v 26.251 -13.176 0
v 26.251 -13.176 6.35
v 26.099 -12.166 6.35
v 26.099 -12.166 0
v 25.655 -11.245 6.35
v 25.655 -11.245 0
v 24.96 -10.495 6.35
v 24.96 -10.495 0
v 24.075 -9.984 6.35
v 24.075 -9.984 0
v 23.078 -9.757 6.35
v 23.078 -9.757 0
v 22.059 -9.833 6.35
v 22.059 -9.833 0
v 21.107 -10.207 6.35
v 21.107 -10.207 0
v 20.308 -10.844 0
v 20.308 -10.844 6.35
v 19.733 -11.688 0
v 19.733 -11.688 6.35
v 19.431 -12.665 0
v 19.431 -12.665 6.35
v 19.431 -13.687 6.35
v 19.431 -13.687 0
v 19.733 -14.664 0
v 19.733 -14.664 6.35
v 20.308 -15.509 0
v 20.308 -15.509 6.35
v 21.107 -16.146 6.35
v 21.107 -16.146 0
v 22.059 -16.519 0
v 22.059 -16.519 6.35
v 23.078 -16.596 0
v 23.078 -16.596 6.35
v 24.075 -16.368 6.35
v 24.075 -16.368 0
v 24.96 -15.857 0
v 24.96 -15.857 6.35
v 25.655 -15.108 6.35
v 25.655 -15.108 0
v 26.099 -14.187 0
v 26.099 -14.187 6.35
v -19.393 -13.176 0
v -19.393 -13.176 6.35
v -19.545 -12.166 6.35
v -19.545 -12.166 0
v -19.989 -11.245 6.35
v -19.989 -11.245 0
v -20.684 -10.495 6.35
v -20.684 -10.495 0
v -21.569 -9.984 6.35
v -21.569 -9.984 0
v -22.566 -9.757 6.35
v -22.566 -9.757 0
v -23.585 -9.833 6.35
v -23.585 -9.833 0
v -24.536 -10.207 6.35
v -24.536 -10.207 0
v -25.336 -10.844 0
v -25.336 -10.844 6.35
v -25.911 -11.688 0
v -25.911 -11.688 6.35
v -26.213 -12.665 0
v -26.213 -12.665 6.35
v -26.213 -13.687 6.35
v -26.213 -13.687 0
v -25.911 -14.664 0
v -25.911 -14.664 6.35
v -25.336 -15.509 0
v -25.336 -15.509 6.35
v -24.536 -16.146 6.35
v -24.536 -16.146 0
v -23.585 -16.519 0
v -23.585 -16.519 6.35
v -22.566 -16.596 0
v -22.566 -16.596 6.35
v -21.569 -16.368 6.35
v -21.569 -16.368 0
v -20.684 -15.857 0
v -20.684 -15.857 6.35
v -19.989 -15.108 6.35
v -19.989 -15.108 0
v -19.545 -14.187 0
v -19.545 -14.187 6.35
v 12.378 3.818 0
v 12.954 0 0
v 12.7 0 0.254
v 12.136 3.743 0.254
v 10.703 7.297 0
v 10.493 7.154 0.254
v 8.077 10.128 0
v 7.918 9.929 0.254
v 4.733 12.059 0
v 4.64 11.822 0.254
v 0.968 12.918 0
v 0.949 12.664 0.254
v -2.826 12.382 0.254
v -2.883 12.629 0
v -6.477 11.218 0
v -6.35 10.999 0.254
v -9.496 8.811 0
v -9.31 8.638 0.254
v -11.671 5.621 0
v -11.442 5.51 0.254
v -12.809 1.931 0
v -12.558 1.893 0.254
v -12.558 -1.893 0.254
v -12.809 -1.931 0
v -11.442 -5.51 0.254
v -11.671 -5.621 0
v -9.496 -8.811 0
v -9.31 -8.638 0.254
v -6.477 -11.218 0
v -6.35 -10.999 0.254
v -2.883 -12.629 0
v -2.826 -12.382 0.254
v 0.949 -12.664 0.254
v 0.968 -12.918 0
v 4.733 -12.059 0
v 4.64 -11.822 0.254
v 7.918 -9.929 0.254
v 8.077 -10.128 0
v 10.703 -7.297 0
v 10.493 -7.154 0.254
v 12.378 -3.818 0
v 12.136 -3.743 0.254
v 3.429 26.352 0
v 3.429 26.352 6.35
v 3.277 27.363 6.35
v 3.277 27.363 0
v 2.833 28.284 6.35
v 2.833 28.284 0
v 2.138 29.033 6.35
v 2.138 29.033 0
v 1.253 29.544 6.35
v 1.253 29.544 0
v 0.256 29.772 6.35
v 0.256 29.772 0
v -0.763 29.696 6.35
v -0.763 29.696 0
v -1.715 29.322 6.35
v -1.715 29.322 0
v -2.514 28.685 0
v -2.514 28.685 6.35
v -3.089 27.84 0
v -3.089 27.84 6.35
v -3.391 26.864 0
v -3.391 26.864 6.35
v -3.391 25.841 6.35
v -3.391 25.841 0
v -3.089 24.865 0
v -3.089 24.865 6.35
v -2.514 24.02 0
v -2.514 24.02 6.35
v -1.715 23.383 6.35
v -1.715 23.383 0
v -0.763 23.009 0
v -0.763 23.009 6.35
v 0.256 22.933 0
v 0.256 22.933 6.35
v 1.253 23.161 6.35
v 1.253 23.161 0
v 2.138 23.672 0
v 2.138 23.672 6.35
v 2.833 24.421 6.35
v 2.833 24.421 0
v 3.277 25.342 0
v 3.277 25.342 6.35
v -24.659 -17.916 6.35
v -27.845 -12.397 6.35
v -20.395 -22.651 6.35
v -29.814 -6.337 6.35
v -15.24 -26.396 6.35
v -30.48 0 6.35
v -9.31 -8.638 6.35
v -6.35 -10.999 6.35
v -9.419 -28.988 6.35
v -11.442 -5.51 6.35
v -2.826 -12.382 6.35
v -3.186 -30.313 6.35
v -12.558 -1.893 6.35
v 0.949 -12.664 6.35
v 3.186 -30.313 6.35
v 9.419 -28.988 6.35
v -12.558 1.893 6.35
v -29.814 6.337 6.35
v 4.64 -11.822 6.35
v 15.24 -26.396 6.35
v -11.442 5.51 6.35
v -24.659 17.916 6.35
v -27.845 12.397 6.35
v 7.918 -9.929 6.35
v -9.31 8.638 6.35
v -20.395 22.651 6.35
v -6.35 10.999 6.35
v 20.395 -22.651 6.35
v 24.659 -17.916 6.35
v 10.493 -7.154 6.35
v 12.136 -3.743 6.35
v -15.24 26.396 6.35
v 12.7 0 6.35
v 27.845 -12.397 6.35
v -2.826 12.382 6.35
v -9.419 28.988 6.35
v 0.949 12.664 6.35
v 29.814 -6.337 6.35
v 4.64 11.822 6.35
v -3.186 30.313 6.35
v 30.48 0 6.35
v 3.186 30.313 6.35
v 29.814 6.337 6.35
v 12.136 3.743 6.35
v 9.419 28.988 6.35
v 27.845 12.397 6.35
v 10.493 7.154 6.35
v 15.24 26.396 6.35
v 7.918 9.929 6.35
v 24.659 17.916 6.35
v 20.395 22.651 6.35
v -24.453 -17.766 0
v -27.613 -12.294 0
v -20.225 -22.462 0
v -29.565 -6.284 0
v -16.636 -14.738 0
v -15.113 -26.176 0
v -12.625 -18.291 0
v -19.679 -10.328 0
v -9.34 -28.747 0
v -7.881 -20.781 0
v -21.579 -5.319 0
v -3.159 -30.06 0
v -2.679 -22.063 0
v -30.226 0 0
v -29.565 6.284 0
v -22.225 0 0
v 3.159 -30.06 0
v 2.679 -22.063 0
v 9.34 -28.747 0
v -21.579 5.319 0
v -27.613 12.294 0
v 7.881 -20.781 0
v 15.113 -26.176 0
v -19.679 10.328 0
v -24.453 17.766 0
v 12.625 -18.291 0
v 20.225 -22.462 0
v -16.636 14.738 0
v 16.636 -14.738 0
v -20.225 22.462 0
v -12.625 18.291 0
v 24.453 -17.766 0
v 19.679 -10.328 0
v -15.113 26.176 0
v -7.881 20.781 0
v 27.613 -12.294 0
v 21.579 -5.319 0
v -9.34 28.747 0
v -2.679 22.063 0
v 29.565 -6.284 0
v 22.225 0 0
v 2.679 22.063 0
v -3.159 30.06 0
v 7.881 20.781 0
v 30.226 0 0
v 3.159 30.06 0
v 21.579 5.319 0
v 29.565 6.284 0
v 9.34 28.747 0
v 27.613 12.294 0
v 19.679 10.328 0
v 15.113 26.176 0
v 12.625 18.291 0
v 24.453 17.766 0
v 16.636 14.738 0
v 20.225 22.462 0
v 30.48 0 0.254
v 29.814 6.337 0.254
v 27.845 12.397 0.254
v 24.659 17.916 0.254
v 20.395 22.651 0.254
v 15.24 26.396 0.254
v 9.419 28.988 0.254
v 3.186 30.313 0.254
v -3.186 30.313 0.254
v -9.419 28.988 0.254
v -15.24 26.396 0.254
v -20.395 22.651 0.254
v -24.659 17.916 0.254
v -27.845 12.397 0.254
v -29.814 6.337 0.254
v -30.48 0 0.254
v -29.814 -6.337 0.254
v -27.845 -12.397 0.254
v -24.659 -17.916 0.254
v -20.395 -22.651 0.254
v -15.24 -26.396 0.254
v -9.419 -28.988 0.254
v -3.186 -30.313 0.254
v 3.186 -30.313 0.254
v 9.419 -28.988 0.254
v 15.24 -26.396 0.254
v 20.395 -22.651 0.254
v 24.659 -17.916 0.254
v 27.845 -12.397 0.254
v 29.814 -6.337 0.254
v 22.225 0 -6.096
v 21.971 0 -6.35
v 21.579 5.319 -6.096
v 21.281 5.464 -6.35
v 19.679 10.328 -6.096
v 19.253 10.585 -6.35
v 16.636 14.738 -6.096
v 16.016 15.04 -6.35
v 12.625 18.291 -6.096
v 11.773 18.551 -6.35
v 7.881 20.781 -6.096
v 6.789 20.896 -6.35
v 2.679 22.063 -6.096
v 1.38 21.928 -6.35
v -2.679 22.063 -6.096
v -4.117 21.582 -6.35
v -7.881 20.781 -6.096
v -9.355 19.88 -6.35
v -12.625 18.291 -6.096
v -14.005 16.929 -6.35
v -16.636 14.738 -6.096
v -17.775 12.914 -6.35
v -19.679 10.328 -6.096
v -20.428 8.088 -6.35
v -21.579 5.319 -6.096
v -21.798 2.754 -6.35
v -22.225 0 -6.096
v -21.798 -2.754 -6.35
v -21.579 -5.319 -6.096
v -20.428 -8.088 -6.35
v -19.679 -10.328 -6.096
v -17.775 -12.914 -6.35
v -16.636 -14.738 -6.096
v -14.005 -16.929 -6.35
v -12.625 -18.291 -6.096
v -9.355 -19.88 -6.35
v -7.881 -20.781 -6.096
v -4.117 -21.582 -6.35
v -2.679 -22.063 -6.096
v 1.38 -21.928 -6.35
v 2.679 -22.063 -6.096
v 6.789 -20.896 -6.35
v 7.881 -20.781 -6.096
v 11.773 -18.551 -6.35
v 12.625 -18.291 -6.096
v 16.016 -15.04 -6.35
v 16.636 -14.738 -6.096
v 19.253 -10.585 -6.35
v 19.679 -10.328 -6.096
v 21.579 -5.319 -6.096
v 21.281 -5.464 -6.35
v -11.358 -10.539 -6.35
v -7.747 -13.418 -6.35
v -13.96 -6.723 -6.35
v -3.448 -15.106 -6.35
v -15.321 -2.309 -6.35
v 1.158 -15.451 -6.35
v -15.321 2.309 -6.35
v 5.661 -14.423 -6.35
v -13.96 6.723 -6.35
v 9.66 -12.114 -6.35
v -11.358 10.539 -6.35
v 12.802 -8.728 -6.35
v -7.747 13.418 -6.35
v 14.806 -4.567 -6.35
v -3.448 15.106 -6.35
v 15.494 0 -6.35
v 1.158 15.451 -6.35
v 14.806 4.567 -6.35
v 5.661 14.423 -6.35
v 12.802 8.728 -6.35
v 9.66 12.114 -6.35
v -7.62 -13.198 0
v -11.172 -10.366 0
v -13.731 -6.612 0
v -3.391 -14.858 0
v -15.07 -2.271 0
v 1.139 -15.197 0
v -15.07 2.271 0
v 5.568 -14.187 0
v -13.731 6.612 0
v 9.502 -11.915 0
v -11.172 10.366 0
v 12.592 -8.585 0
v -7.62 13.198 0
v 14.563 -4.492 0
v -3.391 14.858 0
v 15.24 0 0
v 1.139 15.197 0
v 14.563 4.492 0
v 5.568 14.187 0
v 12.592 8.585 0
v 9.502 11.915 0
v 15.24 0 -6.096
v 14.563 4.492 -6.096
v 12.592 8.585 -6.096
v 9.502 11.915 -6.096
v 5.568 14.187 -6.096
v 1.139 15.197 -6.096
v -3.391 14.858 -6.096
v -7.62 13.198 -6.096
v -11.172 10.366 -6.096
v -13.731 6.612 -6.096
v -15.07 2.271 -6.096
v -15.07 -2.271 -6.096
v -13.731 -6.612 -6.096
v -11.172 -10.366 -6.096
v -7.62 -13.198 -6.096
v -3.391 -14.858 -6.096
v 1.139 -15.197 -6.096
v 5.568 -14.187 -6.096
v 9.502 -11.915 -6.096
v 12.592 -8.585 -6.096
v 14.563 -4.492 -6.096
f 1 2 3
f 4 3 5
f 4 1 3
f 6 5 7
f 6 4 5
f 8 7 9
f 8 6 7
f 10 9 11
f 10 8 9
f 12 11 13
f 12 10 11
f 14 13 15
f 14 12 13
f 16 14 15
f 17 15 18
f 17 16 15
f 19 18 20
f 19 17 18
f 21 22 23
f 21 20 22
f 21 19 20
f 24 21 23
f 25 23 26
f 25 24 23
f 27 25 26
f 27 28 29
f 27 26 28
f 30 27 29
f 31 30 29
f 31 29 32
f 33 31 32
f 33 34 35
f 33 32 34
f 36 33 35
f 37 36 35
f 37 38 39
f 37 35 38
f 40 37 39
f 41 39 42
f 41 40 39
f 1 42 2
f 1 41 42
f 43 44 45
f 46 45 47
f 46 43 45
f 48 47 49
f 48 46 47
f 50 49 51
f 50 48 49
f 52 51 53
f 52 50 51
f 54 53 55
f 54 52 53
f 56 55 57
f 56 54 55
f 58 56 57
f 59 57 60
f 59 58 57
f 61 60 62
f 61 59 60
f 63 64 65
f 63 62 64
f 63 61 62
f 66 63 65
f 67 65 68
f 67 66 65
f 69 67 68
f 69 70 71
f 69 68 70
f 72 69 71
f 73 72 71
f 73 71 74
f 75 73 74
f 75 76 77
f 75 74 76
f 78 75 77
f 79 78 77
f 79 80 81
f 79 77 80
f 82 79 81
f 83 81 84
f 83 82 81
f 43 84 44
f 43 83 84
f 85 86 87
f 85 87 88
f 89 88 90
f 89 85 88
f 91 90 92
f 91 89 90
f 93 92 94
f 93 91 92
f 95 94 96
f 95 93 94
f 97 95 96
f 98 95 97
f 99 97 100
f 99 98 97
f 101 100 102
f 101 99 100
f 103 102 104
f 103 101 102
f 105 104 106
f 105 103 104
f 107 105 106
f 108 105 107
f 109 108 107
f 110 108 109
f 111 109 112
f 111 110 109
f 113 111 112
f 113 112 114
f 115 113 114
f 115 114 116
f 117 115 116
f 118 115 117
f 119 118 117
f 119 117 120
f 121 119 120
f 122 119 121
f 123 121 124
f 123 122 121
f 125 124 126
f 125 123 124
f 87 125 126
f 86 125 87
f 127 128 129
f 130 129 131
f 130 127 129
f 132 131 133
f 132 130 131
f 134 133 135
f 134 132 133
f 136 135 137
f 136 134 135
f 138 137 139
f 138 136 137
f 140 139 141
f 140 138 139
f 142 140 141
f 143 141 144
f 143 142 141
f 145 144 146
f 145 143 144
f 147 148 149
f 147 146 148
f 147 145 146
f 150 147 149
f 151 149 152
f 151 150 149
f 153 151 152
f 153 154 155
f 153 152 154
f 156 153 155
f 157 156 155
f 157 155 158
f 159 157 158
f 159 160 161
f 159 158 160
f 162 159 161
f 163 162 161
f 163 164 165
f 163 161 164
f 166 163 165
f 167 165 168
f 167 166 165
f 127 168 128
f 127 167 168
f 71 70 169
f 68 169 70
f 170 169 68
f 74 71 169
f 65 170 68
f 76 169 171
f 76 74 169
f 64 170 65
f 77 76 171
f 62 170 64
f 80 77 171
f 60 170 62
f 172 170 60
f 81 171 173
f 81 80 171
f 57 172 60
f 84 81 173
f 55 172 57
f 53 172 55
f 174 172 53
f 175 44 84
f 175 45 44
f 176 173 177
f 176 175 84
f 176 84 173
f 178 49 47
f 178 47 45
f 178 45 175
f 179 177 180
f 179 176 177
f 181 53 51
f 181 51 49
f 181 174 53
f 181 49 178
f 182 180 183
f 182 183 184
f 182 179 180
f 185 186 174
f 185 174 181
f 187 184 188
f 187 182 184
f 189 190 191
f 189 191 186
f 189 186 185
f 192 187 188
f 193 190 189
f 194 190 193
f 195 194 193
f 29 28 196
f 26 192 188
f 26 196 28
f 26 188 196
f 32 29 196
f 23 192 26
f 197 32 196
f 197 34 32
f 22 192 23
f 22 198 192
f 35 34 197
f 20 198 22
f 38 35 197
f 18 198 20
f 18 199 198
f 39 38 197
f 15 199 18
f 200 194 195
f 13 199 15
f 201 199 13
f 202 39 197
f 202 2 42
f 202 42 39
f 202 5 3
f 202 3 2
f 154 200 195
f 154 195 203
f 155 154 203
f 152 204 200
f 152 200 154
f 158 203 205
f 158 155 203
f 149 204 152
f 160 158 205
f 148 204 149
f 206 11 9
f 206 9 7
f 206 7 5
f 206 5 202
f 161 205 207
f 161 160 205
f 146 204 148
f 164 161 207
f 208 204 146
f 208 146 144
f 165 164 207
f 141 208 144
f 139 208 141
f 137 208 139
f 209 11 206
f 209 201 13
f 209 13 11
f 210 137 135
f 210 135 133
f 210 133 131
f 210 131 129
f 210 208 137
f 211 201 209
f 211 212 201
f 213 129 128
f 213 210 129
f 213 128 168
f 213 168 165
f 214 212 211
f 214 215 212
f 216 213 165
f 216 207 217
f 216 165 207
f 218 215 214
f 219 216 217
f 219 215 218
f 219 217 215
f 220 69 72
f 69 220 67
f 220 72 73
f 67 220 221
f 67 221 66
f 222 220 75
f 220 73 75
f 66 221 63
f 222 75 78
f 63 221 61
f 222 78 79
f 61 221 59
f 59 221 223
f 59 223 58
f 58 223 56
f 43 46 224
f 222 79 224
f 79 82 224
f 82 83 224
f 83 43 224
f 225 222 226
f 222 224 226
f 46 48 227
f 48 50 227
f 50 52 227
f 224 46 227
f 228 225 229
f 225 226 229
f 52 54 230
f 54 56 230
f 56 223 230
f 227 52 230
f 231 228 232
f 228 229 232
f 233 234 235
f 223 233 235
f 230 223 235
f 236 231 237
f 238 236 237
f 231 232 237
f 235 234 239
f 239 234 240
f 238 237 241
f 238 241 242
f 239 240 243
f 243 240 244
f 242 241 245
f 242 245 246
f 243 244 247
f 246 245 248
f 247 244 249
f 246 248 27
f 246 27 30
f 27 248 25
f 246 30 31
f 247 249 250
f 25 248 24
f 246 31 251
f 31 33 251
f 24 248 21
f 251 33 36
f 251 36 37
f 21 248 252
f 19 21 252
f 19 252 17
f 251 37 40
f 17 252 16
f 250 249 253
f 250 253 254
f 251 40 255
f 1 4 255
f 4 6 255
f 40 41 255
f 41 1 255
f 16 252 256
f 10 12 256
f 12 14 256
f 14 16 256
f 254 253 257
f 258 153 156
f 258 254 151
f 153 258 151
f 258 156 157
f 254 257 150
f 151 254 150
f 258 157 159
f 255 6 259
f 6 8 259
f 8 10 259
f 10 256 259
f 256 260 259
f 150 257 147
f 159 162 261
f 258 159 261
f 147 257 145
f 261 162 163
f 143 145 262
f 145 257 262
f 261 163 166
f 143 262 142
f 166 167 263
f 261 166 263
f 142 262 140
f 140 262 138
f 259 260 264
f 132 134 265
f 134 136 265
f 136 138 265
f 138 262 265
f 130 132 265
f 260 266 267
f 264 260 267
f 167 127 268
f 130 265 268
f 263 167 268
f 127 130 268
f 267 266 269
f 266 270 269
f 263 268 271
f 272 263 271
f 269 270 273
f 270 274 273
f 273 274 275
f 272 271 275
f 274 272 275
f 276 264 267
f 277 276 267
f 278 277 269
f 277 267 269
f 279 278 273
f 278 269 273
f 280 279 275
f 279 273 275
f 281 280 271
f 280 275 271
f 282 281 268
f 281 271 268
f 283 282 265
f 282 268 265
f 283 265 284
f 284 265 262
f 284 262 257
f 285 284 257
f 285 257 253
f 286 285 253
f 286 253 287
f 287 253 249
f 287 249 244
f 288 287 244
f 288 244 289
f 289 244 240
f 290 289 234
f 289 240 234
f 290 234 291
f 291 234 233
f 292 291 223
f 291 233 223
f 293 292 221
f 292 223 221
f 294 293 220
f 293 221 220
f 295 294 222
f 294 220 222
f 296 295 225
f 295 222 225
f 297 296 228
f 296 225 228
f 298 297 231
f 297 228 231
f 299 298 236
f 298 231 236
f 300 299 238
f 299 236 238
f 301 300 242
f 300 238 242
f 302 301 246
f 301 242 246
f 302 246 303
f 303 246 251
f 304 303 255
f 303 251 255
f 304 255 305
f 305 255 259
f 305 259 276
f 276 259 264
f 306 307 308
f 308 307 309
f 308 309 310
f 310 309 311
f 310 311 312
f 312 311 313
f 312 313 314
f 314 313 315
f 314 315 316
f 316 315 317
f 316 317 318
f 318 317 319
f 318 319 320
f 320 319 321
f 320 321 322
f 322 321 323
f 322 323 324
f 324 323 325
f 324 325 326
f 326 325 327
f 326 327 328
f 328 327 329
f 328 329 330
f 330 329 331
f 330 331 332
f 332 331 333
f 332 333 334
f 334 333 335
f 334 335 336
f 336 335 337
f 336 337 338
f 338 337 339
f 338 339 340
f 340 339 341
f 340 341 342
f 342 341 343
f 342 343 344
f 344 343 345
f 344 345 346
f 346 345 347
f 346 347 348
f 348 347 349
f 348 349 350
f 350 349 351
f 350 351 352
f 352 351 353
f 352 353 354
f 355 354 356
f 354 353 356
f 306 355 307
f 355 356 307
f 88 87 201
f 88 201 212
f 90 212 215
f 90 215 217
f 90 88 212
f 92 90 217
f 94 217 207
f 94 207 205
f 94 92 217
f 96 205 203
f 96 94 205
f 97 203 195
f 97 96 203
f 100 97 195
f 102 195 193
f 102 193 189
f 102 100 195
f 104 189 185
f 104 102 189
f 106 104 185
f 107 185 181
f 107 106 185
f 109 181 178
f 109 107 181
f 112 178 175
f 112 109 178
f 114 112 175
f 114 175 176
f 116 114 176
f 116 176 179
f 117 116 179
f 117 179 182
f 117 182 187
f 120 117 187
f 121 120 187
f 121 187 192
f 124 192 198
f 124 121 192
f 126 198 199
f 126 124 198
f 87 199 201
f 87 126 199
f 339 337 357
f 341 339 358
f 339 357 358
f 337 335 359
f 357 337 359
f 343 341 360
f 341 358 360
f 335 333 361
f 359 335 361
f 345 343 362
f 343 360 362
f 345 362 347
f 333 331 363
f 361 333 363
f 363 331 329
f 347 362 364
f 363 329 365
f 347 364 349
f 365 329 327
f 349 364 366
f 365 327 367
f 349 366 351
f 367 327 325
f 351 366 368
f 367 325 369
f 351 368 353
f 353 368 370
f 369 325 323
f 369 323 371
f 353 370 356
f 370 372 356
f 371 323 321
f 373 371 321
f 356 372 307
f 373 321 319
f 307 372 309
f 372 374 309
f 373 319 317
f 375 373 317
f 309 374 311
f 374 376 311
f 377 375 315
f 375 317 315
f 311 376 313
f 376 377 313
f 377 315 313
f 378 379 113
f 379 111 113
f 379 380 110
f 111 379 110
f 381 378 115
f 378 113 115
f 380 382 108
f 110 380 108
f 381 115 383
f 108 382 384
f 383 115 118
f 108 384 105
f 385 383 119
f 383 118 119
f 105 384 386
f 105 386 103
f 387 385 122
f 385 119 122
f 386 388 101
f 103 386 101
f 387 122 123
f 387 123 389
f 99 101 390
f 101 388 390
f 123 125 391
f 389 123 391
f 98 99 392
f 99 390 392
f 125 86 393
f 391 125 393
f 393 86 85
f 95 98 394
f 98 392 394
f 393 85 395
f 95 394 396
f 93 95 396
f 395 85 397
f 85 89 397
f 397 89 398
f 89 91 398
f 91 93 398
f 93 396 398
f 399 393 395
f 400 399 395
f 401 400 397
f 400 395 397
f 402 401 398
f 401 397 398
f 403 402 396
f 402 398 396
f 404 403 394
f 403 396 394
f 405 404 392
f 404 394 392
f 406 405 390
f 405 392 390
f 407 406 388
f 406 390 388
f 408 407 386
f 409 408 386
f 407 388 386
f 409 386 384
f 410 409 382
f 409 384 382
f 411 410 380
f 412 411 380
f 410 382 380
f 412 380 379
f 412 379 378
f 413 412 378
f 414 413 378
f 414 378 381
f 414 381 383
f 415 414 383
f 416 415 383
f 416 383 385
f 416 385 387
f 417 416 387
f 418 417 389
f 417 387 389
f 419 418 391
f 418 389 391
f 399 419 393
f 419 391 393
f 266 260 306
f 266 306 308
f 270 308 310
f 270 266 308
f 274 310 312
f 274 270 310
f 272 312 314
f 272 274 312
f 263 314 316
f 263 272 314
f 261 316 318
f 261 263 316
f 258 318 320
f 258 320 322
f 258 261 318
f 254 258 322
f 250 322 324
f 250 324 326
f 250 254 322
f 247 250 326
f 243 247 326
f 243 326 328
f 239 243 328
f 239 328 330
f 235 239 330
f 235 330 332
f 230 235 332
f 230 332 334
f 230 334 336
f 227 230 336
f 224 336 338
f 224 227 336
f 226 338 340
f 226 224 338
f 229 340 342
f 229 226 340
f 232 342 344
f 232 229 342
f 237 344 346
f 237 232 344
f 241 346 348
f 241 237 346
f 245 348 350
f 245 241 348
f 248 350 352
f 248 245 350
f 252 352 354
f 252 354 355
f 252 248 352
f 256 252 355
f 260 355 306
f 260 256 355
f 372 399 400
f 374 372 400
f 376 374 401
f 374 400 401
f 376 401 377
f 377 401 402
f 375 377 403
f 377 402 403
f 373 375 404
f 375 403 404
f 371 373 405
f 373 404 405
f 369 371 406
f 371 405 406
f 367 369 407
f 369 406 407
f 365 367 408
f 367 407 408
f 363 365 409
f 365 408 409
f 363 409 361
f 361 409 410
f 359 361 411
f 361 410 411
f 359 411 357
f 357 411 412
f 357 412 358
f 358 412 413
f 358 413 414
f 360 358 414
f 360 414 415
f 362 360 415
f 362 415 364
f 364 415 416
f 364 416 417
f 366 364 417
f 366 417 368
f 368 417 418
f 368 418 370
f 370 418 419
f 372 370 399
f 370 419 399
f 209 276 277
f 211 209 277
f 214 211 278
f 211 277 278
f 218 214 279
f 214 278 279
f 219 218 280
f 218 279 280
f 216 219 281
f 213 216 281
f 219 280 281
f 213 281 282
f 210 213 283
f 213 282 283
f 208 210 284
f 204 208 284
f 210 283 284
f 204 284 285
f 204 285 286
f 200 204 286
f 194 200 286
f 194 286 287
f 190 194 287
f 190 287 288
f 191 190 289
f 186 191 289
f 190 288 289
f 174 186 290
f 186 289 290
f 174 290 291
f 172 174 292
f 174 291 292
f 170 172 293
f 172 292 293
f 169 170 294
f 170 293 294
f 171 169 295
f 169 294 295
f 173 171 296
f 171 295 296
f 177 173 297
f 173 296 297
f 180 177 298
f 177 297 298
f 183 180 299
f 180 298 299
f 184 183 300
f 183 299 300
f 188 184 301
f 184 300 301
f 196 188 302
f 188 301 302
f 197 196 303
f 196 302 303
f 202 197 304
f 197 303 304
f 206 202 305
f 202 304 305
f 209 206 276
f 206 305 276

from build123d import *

# Parameters (mm, degrees)
F0_R     = 30.48
F0_R_2   = 12.7
F1_DEPTH = 6.35
F2_R     = 22.225
F2_R_2   = 15.24
F3_DEPTH = 6.35
F2_R_3   = 3.429
F4_DEPTH = 34.798
F5_SIZE  = 0.254


with BuildPart() as f1:
    # F0 (on Top) → F1 (new body)
    with BuildSketch(Plane.XY):
        Circle(F0_R)
        Circle(F0_R_2, mode=Mode.SUBTRACT)
    extrude(amount=F1_DEPTH)

    # F2 (on Top) → F3 (join)
    with BuildSketch(Plane.XY):
        Circle(F2_R)
        Circle(F2_R_2, mode=Mode.SUBTRACT)
    extrude(amount=-F3_DEPTH)

    # F2 (on Top) → F4 (cut)
    with BuildSketch(Plane.XY):
        with Locations((-22.821934, -13.17625)):
            Circle(F2_R_3)
        with Locations((0, 26.3525)):
            Circle(F2_R_3)
        with Locations((22.821934, -13.17625)):
            Circle(F2_R_3)
    extrude(amount=F4_DEPTH, mode=Mode.SUBTRACT)

    # F5
    f5_edges = [f1.edges().sort_by_distance(p)[0] for p in [
        (-30.48, 0, 0),
        (-22.225, 0, -6.35),
        (-15.24, 0, -6.35),
        (-12.7, 0, 0),
    ]]
    chamfer(f5_edges, length=F5_SIZE)


solid = f1.part
